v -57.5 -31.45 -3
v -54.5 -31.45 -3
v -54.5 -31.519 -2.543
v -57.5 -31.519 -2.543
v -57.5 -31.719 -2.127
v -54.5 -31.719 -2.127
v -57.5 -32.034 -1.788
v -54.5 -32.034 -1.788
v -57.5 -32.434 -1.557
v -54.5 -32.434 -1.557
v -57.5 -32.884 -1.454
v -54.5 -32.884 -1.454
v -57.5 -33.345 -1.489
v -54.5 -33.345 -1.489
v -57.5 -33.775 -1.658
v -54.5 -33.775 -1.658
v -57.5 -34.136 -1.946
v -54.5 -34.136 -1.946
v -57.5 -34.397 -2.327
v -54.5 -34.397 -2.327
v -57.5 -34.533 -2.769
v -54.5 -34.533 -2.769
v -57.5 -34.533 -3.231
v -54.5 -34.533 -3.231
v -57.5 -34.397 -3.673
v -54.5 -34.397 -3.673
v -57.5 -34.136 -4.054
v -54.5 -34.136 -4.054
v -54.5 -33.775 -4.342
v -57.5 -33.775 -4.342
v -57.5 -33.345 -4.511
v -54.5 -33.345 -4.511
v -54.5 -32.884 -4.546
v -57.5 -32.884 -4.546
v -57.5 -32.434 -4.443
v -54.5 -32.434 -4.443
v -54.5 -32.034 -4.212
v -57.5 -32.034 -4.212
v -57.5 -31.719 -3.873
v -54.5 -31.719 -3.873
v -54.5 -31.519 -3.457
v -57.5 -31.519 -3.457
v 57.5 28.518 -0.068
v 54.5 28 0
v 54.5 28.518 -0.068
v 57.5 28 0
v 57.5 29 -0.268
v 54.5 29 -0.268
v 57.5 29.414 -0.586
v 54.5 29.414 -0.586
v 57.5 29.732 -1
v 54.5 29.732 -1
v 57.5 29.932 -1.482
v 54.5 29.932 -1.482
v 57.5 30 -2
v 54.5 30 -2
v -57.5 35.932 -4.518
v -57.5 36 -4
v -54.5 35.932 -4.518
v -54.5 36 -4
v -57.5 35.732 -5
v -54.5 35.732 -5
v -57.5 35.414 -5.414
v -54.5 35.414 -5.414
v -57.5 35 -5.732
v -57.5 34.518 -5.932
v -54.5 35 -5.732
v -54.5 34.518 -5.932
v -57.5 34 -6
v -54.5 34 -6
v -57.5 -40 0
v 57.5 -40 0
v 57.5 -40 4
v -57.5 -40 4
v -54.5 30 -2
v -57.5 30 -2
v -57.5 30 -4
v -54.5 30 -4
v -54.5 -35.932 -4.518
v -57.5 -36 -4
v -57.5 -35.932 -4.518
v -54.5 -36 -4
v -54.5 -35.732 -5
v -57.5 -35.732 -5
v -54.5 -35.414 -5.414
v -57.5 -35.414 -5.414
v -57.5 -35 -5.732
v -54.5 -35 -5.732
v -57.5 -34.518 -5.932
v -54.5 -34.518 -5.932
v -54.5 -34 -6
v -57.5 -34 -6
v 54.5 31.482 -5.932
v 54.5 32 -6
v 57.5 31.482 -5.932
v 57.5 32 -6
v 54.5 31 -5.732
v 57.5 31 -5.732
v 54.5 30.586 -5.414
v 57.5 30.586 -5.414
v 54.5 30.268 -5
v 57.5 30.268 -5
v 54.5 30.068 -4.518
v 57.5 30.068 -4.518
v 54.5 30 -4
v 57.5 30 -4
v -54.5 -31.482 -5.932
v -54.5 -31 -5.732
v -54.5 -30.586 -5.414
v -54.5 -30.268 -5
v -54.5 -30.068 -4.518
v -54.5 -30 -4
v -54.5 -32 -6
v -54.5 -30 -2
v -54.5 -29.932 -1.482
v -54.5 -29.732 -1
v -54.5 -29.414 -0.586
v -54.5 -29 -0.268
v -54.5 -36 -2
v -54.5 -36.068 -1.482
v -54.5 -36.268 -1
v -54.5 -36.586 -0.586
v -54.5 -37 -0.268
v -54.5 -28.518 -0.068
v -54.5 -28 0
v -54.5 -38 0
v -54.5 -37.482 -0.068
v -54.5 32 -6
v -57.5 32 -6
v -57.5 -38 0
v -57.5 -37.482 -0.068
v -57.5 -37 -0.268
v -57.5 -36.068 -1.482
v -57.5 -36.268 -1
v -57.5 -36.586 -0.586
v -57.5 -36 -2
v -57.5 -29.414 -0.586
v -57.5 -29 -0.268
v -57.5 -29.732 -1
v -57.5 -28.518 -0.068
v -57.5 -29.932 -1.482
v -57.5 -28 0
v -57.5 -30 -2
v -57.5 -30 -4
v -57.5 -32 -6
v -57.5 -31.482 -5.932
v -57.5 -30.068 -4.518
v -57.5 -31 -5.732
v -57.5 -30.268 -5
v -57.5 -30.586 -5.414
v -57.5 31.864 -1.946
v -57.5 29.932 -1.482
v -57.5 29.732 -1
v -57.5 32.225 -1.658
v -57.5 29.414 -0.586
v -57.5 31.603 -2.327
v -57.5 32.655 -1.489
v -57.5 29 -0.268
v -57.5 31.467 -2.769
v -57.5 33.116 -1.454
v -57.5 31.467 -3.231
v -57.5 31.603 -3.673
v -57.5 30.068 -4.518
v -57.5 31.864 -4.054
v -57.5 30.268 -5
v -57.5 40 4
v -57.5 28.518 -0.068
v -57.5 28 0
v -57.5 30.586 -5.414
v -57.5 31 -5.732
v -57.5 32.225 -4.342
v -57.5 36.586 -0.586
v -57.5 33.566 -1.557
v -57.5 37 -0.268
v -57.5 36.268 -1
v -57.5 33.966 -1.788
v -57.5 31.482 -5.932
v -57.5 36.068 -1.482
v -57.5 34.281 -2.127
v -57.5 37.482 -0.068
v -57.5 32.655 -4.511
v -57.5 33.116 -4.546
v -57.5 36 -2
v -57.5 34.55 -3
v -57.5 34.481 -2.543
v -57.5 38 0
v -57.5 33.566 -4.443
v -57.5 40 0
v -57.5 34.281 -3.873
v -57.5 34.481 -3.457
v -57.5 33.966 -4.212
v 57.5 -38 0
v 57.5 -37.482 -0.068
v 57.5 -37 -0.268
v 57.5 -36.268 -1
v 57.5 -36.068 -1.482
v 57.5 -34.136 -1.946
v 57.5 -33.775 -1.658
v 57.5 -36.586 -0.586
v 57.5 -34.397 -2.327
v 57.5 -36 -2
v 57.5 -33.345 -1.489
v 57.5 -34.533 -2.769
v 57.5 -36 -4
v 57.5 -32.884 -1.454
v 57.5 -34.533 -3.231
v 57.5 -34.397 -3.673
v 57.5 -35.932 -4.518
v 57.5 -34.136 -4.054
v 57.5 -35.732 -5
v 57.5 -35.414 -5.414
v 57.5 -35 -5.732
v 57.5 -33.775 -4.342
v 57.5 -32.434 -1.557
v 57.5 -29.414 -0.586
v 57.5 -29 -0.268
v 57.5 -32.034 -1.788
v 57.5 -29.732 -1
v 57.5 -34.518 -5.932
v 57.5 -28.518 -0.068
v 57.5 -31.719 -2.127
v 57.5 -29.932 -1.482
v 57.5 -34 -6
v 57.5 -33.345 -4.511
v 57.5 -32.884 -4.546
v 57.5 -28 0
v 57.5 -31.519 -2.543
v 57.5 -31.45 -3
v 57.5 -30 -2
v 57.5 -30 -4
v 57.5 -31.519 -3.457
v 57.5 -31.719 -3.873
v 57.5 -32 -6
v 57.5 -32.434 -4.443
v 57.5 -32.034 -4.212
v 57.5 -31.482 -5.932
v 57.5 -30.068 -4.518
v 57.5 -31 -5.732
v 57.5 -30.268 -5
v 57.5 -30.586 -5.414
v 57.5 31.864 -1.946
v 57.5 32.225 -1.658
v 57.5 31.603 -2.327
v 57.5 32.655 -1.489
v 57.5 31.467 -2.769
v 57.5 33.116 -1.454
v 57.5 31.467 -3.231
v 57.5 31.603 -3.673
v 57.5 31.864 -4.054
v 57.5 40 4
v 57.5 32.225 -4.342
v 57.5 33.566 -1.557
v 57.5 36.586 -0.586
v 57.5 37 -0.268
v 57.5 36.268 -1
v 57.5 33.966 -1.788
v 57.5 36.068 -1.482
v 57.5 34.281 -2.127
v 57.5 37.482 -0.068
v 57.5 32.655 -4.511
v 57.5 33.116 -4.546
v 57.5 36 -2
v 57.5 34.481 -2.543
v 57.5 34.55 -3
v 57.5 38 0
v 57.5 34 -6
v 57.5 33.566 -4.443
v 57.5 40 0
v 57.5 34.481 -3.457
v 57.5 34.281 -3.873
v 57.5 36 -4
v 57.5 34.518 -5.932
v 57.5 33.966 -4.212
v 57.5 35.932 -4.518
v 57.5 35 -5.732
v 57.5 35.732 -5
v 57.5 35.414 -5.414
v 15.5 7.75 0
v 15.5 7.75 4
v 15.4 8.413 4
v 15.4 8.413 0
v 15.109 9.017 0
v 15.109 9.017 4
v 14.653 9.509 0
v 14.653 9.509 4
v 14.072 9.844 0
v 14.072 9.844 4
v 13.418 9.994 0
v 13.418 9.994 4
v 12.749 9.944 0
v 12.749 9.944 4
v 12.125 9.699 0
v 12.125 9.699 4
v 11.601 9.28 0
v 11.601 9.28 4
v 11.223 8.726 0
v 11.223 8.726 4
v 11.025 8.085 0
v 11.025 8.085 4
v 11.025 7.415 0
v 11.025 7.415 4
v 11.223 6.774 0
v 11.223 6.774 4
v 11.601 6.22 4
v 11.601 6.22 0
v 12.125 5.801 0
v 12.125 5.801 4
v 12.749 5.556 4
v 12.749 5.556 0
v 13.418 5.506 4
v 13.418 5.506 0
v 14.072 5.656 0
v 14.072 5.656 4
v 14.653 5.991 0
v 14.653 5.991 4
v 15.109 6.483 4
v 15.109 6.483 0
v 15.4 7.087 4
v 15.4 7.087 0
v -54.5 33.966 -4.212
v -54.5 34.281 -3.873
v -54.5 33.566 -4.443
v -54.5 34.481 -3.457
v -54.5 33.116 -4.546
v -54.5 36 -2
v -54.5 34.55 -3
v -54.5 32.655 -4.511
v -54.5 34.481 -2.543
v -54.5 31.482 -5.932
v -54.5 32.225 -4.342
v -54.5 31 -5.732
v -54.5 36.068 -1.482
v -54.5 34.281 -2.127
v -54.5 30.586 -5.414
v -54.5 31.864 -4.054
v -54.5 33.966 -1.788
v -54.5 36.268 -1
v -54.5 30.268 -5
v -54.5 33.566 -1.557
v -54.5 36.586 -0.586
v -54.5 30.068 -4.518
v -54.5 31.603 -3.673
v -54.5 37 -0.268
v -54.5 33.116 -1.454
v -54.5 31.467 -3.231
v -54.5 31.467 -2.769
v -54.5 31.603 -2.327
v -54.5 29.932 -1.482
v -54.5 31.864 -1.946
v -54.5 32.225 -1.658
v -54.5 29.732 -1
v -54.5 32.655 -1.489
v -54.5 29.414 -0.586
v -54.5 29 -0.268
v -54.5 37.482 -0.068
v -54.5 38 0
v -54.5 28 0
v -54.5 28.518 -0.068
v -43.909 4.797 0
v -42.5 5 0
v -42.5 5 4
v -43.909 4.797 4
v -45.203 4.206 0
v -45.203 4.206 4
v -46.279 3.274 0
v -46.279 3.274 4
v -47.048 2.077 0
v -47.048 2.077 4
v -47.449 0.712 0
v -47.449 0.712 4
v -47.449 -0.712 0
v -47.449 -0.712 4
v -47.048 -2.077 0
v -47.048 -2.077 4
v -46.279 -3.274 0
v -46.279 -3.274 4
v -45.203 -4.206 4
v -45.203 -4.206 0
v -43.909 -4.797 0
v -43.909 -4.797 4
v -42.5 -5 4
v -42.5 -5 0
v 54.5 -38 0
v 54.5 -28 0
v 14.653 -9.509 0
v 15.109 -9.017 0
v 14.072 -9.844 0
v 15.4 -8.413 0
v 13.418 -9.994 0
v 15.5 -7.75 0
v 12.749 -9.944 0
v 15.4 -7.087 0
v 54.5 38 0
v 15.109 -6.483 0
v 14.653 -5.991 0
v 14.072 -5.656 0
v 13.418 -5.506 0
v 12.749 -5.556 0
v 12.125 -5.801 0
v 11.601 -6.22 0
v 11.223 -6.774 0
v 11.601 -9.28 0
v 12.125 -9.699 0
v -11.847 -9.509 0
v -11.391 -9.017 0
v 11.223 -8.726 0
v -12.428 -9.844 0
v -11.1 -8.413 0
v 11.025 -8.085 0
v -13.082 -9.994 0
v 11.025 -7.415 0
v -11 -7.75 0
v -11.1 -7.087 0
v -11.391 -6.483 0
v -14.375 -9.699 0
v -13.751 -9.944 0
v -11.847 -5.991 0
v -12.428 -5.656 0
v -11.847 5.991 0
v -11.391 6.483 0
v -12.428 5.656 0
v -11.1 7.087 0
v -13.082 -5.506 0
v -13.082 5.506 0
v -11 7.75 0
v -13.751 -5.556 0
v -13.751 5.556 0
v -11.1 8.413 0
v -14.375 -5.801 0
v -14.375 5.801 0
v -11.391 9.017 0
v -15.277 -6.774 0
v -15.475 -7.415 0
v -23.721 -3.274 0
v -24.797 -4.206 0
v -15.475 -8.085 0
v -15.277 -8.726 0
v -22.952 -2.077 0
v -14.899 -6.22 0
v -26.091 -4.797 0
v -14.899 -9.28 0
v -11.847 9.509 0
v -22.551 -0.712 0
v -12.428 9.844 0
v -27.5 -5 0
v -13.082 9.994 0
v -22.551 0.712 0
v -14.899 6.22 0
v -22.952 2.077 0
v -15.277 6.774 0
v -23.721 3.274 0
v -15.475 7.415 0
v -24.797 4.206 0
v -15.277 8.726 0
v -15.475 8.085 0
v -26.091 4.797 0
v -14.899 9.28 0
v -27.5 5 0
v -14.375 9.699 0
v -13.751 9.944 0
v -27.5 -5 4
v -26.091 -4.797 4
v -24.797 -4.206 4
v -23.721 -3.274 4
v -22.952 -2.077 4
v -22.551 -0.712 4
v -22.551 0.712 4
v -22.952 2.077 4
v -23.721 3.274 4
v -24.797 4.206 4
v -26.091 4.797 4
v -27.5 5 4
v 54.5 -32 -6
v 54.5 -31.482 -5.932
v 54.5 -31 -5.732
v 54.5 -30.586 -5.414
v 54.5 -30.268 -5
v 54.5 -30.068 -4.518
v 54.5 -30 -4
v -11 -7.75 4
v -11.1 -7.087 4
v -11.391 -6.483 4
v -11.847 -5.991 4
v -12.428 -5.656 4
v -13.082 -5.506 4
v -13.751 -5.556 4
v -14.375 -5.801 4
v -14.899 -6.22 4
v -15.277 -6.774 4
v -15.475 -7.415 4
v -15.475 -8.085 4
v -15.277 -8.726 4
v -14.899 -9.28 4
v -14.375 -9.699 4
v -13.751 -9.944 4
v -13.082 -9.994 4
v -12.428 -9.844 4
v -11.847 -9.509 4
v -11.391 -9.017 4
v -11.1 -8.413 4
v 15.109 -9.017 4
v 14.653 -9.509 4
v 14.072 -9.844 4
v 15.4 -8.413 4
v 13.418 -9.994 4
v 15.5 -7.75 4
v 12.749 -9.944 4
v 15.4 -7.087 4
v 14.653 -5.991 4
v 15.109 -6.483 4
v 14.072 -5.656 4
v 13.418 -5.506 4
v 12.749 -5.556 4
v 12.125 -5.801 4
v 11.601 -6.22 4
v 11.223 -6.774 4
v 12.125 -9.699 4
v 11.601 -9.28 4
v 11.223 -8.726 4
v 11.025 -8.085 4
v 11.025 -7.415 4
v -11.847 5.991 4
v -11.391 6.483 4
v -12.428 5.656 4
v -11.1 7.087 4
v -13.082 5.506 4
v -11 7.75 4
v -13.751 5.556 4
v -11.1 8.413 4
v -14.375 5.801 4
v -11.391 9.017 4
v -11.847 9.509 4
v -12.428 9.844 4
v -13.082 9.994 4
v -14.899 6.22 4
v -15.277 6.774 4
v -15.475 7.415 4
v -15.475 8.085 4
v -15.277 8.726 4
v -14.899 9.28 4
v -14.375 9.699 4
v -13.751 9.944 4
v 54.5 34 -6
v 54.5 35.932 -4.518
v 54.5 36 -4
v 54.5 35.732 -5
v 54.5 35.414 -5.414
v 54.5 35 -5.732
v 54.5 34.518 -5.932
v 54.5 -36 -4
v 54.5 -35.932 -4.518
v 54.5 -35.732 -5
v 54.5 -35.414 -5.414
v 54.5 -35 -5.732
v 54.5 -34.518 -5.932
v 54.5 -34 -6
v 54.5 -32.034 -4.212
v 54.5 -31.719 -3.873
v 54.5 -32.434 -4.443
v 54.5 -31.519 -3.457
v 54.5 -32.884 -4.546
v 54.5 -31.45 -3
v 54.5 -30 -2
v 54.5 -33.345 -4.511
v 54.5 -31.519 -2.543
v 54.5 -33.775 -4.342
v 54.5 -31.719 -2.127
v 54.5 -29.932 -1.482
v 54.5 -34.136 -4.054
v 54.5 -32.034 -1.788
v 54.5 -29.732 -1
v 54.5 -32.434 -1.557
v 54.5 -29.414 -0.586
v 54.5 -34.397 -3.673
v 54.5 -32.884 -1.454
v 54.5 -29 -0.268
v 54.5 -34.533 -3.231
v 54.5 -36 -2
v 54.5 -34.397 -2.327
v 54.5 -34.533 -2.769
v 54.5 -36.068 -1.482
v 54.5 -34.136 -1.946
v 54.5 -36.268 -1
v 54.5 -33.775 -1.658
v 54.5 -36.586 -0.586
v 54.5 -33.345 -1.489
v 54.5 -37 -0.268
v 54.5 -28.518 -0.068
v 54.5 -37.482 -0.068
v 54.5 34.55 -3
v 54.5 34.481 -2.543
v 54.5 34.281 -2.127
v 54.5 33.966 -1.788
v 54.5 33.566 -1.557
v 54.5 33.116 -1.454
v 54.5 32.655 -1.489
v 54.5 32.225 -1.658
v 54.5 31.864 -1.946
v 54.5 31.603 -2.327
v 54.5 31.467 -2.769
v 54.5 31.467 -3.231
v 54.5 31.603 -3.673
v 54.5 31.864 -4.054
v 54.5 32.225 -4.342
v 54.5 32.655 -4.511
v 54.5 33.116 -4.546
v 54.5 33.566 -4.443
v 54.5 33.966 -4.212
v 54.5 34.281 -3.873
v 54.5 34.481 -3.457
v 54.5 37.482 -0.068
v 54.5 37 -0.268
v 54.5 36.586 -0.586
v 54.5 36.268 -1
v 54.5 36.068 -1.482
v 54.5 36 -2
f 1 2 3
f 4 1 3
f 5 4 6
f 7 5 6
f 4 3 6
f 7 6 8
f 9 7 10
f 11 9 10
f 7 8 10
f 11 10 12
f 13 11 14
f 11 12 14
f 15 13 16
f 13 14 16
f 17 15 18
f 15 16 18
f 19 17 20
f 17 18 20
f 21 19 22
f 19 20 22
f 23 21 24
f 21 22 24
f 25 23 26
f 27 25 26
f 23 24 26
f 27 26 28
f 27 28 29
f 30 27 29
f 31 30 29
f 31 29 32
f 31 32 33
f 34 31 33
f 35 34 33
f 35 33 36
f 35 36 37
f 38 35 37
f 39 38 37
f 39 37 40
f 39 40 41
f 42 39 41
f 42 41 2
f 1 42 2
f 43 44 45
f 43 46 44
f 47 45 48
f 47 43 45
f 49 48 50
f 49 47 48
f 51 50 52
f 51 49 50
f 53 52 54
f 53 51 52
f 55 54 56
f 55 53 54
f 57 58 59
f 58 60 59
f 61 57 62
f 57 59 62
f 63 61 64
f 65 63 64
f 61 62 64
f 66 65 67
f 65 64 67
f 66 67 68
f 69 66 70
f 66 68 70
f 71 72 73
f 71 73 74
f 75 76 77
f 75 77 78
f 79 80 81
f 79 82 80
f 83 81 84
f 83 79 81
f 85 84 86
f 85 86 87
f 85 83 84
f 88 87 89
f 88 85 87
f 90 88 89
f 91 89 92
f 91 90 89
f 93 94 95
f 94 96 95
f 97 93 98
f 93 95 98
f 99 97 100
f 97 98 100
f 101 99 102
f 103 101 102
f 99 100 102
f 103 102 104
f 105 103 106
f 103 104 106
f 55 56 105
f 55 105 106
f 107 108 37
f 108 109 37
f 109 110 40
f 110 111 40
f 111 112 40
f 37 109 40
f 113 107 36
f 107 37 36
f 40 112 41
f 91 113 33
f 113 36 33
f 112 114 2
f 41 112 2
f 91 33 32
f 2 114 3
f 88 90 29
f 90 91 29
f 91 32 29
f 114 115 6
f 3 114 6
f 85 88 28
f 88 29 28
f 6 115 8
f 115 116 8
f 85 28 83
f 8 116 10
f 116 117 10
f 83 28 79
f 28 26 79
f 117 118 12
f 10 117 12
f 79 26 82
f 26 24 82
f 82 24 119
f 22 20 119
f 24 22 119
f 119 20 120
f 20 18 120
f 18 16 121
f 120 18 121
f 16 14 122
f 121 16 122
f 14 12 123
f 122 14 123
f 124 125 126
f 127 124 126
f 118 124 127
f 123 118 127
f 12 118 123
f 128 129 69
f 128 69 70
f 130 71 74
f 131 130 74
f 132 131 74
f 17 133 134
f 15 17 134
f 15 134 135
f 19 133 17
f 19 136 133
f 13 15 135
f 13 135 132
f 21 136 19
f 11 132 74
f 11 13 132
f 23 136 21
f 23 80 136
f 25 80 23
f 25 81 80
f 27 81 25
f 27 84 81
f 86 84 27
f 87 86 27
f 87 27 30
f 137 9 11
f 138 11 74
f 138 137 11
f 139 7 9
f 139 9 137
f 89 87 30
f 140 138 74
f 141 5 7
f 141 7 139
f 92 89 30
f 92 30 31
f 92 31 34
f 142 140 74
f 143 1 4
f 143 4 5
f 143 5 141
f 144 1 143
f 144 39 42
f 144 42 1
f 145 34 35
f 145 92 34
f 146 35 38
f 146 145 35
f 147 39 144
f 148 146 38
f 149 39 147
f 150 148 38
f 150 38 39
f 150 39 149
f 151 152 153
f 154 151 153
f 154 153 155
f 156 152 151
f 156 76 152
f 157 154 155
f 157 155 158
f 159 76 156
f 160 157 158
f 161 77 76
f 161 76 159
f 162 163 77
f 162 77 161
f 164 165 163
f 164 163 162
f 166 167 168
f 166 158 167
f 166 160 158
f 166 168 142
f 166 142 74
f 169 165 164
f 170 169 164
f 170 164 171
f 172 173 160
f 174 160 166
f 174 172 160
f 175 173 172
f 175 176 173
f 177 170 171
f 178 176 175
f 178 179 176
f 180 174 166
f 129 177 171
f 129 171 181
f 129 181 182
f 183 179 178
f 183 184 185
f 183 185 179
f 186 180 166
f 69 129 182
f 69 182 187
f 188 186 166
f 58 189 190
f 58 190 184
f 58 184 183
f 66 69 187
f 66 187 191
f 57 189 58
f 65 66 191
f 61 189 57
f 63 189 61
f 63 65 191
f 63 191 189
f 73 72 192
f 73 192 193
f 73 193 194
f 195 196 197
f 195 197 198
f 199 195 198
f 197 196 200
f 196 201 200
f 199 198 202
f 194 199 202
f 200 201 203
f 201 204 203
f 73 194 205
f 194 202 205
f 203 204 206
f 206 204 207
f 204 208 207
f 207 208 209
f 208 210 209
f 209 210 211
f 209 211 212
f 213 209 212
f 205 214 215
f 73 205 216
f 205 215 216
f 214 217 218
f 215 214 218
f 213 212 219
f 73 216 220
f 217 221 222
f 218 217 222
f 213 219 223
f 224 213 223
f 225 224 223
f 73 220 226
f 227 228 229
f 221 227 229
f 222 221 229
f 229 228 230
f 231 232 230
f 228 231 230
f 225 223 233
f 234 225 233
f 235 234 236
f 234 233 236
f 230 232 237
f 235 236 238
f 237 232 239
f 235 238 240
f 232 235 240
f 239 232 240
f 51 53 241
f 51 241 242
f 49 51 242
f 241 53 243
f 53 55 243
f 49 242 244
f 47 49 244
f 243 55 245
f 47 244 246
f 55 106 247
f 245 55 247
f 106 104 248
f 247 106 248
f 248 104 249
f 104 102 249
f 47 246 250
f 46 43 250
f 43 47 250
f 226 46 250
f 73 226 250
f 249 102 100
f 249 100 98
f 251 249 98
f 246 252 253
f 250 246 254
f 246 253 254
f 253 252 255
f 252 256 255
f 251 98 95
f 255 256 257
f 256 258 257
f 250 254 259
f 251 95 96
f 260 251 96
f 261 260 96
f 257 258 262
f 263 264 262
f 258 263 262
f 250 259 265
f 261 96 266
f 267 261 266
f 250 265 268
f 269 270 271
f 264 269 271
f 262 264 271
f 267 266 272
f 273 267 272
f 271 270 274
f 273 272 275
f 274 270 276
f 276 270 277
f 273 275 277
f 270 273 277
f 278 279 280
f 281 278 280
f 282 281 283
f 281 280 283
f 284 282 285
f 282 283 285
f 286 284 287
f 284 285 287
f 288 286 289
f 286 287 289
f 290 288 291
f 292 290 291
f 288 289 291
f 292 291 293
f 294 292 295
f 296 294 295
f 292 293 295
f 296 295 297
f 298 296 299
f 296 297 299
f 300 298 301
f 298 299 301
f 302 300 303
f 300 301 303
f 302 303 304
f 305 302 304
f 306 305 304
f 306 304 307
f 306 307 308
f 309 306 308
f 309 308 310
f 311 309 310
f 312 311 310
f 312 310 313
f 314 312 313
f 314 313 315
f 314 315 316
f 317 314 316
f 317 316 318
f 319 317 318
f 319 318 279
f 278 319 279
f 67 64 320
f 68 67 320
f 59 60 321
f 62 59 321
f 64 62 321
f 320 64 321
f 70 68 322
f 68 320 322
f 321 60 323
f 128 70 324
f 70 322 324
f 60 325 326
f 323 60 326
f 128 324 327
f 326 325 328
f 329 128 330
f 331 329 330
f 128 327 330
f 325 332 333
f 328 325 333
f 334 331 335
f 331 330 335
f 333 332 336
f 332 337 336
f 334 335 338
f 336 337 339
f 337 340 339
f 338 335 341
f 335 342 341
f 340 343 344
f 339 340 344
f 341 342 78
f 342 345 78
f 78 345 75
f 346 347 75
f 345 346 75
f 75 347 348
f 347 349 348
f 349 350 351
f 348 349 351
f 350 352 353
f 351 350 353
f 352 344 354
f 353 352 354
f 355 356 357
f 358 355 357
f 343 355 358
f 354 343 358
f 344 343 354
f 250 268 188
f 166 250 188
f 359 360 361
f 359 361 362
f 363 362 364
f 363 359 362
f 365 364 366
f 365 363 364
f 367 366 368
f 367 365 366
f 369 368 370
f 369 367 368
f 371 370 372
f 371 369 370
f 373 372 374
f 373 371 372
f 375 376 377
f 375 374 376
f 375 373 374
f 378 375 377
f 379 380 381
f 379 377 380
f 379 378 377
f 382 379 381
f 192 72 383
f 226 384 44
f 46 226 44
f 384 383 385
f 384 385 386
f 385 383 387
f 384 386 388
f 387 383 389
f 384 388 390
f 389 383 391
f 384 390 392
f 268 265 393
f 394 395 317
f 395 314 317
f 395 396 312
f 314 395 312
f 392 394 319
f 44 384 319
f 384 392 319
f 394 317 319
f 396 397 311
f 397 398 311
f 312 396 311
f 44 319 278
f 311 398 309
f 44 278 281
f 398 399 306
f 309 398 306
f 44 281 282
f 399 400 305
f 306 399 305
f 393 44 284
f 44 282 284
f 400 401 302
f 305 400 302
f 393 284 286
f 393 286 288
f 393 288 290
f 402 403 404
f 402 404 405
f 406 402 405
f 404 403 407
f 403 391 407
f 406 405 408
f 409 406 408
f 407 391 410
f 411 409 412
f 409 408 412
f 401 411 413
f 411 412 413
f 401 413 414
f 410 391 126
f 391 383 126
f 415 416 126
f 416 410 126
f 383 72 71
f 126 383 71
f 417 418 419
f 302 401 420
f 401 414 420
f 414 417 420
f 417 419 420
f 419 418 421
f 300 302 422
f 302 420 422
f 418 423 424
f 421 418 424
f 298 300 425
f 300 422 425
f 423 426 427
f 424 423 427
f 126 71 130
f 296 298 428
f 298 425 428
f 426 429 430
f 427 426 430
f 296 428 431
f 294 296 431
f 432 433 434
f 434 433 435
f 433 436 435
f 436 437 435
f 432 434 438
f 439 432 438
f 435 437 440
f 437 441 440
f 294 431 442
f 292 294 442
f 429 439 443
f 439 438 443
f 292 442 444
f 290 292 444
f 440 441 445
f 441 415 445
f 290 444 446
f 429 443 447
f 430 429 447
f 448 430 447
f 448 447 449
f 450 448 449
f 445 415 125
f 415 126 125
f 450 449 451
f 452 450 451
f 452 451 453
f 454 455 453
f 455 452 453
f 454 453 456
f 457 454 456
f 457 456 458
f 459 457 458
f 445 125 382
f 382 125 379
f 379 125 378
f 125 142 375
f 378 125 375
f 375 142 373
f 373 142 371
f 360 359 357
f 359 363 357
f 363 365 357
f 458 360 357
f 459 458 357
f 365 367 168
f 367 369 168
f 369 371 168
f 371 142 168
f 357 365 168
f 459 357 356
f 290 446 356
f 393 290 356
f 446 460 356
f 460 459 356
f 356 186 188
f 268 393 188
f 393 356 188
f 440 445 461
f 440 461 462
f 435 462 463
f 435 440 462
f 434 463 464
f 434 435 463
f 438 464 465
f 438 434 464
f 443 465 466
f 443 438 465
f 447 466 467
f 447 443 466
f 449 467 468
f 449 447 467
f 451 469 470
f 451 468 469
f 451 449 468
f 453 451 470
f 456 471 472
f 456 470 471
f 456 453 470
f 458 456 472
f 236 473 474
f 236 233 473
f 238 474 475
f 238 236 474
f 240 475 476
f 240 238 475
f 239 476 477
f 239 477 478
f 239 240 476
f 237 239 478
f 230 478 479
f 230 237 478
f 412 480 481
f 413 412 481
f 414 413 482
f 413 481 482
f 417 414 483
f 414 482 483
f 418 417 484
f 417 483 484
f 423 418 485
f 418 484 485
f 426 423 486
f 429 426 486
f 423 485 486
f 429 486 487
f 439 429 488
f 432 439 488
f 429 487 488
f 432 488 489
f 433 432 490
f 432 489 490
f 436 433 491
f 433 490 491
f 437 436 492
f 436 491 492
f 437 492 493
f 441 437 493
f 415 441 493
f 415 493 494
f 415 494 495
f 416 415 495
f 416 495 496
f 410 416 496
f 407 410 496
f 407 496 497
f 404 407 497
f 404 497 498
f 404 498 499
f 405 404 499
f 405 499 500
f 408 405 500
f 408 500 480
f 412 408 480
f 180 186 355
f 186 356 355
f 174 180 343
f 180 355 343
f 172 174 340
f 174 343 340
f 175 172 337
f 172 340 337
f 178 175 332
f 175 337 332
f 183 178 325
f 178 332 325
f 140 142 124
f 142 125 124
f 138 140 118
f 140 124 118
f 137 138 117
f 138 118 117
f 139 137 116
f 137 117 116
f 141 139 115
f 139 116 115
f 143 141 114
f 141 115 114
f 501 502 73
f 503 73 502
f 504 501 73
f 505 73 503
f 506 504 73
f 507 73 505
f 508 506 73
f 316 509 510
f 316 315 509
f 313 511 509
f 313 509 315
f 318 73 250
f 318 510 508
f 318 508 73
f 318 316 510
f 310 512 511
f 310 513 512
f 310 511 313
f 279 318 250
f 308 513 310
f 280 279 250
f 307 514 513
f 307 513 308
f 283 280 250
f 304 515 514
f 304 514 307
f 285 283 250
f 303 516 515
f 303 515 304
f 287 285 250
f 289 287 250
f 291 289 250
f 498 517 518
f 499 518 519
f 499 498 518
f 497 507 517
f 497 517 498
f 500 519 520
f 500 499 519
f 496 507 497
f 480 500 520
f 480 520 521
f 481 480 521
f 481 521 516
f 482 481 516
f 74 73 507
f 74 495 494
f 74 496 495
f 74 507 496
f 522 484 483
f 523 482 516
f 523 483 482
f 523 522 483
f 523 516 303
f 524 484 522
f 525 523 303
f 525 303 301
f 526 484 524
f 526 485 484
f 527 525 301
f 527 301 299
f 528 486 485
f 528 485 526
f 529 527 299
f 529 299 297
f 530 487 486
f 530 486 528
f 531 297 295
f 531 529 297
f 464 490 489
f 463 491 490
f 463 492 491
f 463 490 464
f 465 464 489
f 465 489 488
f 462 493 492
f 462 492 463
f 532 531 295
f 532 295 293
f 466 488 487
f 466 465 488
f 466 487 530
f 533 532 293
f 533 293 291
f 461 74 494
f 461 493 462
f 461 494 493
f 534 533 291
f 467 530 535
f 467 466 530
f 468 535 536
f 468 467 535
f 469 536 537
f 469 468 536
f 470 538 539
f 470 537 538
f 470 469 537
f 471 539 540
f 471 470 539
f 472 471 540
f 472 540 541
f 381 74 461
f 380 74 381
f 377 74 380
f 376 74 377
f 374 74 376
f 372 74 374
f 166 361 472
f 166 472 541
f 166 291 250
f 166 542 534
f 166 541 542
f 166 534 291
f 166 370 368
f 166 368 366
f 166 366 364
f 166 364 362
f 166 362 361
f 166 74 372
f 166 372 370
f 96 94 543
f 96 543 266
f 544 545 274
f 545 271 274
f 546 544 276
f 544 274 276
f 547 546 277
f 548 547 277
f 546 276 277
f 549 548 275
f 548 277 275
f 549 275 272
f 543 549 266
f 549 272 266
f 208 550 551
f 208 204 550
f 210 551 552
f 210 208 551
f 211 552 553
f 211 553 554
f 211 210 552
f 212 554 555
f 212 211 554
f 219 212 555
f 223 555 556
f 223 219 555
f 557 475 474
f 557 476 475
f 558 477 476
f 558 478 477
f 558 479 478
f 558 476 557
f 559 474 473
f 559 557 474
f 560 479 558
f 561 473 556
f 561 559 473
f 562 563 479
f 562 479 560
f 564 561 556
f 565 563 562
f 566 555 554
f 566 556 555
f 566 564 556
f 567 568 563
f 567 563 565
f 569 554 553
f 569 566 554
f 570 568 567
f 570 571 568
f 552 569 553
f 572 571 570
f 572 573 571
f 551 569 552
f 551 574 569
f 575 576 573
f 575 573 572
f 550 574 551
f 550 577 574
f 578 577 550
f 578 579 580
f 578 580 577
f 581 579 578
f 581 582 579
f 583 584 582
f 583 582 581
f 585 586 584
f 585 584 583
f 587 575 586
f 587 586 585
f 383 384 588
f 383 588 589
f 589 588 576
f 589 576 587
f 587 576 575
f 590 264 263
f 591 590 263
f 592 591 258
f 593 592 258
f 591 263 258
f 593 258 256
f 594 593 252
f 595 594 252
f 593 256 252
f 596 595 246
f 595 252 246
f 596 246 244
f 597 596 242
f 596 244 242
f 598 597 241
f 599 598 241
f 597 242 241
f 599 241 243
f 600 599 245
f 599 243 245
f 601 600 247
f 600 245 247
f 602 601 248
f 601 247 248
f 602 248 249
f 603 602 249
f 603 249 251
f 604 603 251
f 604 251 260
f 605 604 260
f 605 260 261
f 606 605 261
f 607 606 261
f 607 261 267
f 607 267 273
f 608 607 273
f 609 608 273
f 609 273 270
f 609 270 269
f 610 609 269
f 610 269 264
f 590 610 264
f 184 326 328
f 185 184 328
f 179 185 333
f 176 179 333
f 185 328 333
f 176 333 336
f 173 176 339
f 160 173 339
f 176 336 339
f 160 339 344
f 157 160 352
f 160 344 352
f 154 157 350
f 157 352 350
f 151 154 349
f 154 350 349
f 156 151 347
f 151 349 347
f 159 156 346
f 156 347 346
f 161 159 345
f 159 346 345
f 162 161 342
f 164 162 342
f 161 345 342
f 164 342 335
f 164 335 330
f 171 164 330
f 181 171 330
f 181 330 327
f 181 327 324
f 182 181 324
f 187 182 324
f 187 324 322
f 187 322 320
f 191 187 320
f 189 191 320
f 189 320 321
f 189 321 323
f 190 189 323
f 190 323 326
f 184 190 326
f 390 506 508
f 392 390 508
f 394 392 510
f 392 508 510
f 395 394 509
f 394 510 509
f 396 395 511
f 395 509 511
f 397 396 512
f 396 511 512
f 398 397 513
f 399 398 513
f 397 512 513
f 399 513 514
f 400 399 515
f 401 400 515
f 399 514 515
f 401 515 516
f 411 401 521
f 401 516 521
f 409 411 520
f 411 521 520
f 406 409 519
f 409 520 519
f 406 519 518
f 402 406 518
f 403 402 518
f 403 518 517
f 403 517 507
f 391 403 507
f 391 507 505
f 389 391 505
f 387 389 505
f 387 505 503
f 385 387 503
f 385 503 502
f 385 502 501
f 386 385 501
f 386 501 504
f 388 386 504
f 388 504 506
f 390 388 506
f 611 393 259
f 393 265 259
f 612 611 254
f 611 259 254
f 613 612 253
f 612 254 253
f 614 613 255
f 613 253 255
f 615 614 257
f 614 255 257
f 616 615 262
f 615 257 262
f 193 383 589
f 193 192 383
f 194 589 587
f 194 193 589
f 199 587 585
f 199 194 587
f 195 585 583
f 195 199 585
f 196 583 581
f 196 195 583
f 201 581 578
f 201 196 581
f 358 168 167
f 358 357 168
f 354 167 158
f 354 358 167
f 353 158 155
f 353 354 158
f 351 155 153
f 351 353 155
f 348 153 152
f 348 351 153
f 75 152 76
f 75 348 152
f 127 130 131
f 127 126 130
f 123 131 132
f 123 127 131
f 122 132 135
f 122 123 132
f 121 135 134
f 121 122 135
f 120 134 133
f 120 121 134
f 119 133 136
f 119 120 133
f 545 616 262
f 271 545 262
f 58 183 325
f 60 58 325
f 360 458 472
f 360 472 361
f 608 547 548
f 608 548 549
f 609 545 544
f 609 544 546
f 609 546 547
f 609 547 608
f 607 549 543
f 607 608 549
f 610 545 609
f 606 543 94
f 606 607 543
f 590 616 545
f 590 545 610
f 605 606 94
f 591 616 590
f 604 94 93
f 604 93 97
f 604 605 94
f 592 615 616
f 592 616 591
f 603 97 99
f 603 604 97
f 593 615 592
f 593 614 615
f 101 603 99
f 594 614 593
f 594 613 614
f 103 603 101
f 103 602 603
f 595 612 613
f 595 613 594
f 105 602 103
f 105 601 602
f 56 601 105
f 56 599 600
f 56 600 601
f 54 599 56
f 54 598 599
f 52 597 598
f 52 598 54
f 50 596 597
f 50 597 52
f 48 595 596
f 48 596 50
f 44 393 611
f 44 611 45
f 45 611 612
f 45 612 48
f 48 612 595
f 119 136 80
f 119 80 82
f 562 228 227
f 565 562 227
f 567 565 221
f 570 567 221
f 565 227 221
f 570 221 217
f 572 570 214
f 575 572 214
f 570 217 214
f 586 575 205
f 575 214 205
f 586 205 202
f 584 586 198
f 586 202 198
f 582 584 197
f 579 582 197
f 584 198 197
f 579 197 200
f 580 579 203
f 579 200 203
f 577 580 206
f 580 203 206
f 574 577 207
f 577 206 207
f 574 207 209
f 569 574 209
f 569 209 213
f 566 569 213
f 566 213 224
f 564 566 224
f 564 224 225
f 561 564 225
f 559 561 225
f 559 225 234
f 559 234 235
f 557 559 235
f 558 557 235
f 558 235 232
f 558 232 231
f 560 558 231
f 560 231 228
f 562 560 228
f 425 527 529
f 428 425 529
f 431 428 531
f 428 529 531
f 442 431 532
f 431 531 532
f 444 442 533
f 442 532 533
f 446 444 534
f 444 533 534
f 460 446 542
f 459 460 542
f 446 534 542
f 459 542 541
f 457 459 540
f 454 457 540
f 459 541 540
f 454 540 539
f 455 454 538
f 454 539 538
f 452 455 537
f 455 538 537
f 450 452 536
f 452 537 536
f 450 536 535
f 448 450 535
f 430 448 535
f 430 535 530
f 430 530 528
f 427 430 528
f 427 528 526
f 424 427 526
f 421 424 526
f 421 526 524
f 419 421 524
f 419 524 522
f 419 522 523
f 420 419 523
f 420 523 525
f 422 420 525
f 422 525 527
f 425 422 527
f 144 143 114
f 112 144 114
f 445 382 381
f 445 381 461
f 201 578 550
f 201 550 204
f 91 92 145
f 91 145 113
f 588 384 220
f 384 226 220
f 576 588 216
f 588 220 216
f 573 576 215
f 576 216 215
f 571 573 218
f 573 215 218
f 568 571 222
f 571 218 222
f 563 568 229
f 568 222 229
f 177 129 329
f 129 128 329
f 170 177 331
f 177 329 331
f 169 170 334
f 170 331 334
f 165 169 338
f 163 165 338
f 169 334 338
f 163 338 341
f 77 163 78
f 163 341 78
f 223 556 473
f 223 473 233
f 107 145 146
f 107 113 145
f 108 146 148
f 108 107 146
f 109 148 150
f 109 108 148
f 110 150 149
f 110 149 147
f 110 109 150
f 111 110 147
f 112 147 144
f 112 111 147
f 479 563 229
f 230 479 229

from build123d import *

# Parameters (mm, degrees)
SKETCH1_W               = 80
SKETCH1_H               = 115
BOSS_EXTRUDE1_DEPTH     = 4
CUT_EXTRUDE1_REACH      = 6
SKETCH2_R               = 2.25
SKETCH4_W               = 3
SKETCH4_H               = 6
BOSS_EXTRUDE3_DEPTH     = 6
SKETCH5_R               = 1.55
CUT_EXTRUDE2_DEPTH      = 1
CUT_EXTRUDE2_DEPTH_BACK = 116
FILLET1_R               = 2
CUT_EXTRUDE3_REACH      = 6


with BuildPart() as part:
    # Sketch1 → Boss-Extrude1 (new body)
    with BuildSketch(Plane(origin=(0, 0, 0), x_dir=(0, 1, 0), z_dir=(0, 0, 1))):
        Rectangle(SKETCH1_W, SKETCH1_H)
    extrude(amount=BOSS_EXTRUDE1_DEPTH)

    # Sketch2 → Cut-Extrude1 (cut, up to next)
    with BuildSketch(Plane.XY.offset(4), mode=Mode.PRIVATE) as cut_extrude1_sk1:
        with Locations((13.25, 7.75)):
            Circle(SKETCH2_R)
    cut_extrude1_tool1 = extrude(cut_extrude1_sk1.sketch, amount=-CUT_EXTRUDE1_REACH, mode=Mode.PRIVATE) & part.part
    add(cut_extrude1_tool1.solids().sort_by_distance((13.25, 7.75, 4))[0], mode=Mode.SUBTRACT)
    # Sketch2 → Cut-Extrude1 (cut, up to next)
    with BuildSketch(Plane.XY.offset(4), mode=Mode.PRIVATE) as cut_extrude1_sk2:
        with Locations((-13.25, 7.75)):
            Circle(SKETCH2_R)
    cut_extrude1_tool2 = extrude(cut_extrude1_sk2.sketch, amount=-CUT_EXTRUDE1_REACH, mode=Mode.PRIVATE) & part.part
    add(cut_extrude1_tool2.solids().sort_by_distance((-13.25, 7.75, 4))[0], mode=Mode.SUBTRACT)
    # Sketch2 → Cut-Extrude1 (cut, up to next)
    with BuildSketch(Plane.XY.offset(4), mode=Mode.PRIVATE) as cut_extrude1_sk3:
        with Locations((13.25, -7.75)):
            Circle(SKETCH2_R)
    cut_extrude1_tool3 = extrude(cut_extrude1_sk3.sketch, amount=-CUT_EXTRUDE1_REACH, mode=Mode.PRIVATE) & part.part
    add(cut_extrude1_tool3.solids().sort_by_distance((13.25, -7.75, 4))[0], mode=Mode.SUBTRACT)
    # Sketch2 → Cut-Extrude1 (cut, up to next)
    with BuildSketch(Plane.XY.offset(4), mode=Mode.PRIVATE) as cut_extrude1_sk4:
        with Locations((-13.25, -7.75)):
            Circle(SKETCH2_R)
    cut_extrude1_tool4 = extrude(cut_extrude1_sk4.sketch, amount=-CUT_EXTRUDE1_REACH, mode=Mode.PRIVATE) & part.part
    add(cut_extrude1_tool4.solids().sort_by_distance((-13.25, -7.75, 4))[0], mode=Mode.SUBTRACT)

    # Sketch4 → Boss-Extrude3 (add)
    with BuildSketch(Plane(origin=(0, 0, 0), x_dir=(1, 0, 0), z_dir=(0, 0, -1))):
        with Locations((-56, 33)):
            Rectangle(SKETCH4_W, SKETCH4_H)
        with Locations((56, 33)):
            Rectangle(SKETCH4_W, SKETCH4_H)
        with Locations((-56, -33)):
            Rectangle(SKETCH4_W, SKETCH4_H)
        with Locations((56, -33)):
            Rectangle(SKETCH4_W, SKETCH4_H)
    extrude(amount=BOSS_EXTRUDE3_DEPTH)

    # Sketch5 → Cut-Extrude2 (cut, two sides)
    with BuildSketch(Plane.YZ.offset(57.5)) as cut_extrude2_sk:
        with Locations((-33, -3)):
            Circle(SKETCH5_R)
        with Locations((33, -3)):
            Circle(SKETCH5_R)
    extrude(amount=CUT_EXTRUDE2_DEPTH, mode=Mode.SUBTRACT)
    extrude(cut_extrude2_sk.sketch, amount=-CUT_EXTRUDE2_DEPTH_BACK, mode=Mode.SUBTRACT)

    # Fillet1
    fillet1_edges = [part.edges().sort_by_distance(p)[0] for p in [
        (56, 30, 0),
        (56, 36, 0),
        (56, 30, -6),
        (56, 36, -6),
        (-56, 30, 0),
        (-56, 36, 0),
        (-56, 30, -6),
        (-56, 36, -6),
        (-56, -30, 0),
        (-56, -36, 0),
        (-56, -30, -6),
        (-56, -36, -6),
        (56, -36, 0),
        (56, -30, 0),
        (56, -36, -6),
        (56, -30, -6),
    ]]
    fillet(fillet1_edges, radius=FILLET1_R)

    # Sketch6 → Cut-Extrude3 (cut, up to next)
    with BuildSketch(Plane(origin=(0, 0, 0), x_dir=(1, 0, 0), z_dir=(0, 0, -1)), mode=Mode.PRIVATE) as cut_extrude3_sk1:
        with BuildLine():
            Line((-42.5, 5), (-27.5, 5))
            ThreePointArc((-27.5, 5), (-22.5, 0), (-27.5, -5))
            Line((-27.5, -5), (-42.5, -5))
            ThreePointArc((-42.5, -5), (-47.5, 0), (-42.5, 5))
        make_face()
    cut_extrude3_tool1 = extrude(cut_extrude3_sk1.sketch, amount=-CUT_EXTRUDE3_REACH, mode=Mode.PRIVATE) & part.part
    add(cut_extrude3_tool1.solids().sort_by_distance((-35, 0, 0))[0], mode=Mode.SUBTRACT)


solid = part.part
